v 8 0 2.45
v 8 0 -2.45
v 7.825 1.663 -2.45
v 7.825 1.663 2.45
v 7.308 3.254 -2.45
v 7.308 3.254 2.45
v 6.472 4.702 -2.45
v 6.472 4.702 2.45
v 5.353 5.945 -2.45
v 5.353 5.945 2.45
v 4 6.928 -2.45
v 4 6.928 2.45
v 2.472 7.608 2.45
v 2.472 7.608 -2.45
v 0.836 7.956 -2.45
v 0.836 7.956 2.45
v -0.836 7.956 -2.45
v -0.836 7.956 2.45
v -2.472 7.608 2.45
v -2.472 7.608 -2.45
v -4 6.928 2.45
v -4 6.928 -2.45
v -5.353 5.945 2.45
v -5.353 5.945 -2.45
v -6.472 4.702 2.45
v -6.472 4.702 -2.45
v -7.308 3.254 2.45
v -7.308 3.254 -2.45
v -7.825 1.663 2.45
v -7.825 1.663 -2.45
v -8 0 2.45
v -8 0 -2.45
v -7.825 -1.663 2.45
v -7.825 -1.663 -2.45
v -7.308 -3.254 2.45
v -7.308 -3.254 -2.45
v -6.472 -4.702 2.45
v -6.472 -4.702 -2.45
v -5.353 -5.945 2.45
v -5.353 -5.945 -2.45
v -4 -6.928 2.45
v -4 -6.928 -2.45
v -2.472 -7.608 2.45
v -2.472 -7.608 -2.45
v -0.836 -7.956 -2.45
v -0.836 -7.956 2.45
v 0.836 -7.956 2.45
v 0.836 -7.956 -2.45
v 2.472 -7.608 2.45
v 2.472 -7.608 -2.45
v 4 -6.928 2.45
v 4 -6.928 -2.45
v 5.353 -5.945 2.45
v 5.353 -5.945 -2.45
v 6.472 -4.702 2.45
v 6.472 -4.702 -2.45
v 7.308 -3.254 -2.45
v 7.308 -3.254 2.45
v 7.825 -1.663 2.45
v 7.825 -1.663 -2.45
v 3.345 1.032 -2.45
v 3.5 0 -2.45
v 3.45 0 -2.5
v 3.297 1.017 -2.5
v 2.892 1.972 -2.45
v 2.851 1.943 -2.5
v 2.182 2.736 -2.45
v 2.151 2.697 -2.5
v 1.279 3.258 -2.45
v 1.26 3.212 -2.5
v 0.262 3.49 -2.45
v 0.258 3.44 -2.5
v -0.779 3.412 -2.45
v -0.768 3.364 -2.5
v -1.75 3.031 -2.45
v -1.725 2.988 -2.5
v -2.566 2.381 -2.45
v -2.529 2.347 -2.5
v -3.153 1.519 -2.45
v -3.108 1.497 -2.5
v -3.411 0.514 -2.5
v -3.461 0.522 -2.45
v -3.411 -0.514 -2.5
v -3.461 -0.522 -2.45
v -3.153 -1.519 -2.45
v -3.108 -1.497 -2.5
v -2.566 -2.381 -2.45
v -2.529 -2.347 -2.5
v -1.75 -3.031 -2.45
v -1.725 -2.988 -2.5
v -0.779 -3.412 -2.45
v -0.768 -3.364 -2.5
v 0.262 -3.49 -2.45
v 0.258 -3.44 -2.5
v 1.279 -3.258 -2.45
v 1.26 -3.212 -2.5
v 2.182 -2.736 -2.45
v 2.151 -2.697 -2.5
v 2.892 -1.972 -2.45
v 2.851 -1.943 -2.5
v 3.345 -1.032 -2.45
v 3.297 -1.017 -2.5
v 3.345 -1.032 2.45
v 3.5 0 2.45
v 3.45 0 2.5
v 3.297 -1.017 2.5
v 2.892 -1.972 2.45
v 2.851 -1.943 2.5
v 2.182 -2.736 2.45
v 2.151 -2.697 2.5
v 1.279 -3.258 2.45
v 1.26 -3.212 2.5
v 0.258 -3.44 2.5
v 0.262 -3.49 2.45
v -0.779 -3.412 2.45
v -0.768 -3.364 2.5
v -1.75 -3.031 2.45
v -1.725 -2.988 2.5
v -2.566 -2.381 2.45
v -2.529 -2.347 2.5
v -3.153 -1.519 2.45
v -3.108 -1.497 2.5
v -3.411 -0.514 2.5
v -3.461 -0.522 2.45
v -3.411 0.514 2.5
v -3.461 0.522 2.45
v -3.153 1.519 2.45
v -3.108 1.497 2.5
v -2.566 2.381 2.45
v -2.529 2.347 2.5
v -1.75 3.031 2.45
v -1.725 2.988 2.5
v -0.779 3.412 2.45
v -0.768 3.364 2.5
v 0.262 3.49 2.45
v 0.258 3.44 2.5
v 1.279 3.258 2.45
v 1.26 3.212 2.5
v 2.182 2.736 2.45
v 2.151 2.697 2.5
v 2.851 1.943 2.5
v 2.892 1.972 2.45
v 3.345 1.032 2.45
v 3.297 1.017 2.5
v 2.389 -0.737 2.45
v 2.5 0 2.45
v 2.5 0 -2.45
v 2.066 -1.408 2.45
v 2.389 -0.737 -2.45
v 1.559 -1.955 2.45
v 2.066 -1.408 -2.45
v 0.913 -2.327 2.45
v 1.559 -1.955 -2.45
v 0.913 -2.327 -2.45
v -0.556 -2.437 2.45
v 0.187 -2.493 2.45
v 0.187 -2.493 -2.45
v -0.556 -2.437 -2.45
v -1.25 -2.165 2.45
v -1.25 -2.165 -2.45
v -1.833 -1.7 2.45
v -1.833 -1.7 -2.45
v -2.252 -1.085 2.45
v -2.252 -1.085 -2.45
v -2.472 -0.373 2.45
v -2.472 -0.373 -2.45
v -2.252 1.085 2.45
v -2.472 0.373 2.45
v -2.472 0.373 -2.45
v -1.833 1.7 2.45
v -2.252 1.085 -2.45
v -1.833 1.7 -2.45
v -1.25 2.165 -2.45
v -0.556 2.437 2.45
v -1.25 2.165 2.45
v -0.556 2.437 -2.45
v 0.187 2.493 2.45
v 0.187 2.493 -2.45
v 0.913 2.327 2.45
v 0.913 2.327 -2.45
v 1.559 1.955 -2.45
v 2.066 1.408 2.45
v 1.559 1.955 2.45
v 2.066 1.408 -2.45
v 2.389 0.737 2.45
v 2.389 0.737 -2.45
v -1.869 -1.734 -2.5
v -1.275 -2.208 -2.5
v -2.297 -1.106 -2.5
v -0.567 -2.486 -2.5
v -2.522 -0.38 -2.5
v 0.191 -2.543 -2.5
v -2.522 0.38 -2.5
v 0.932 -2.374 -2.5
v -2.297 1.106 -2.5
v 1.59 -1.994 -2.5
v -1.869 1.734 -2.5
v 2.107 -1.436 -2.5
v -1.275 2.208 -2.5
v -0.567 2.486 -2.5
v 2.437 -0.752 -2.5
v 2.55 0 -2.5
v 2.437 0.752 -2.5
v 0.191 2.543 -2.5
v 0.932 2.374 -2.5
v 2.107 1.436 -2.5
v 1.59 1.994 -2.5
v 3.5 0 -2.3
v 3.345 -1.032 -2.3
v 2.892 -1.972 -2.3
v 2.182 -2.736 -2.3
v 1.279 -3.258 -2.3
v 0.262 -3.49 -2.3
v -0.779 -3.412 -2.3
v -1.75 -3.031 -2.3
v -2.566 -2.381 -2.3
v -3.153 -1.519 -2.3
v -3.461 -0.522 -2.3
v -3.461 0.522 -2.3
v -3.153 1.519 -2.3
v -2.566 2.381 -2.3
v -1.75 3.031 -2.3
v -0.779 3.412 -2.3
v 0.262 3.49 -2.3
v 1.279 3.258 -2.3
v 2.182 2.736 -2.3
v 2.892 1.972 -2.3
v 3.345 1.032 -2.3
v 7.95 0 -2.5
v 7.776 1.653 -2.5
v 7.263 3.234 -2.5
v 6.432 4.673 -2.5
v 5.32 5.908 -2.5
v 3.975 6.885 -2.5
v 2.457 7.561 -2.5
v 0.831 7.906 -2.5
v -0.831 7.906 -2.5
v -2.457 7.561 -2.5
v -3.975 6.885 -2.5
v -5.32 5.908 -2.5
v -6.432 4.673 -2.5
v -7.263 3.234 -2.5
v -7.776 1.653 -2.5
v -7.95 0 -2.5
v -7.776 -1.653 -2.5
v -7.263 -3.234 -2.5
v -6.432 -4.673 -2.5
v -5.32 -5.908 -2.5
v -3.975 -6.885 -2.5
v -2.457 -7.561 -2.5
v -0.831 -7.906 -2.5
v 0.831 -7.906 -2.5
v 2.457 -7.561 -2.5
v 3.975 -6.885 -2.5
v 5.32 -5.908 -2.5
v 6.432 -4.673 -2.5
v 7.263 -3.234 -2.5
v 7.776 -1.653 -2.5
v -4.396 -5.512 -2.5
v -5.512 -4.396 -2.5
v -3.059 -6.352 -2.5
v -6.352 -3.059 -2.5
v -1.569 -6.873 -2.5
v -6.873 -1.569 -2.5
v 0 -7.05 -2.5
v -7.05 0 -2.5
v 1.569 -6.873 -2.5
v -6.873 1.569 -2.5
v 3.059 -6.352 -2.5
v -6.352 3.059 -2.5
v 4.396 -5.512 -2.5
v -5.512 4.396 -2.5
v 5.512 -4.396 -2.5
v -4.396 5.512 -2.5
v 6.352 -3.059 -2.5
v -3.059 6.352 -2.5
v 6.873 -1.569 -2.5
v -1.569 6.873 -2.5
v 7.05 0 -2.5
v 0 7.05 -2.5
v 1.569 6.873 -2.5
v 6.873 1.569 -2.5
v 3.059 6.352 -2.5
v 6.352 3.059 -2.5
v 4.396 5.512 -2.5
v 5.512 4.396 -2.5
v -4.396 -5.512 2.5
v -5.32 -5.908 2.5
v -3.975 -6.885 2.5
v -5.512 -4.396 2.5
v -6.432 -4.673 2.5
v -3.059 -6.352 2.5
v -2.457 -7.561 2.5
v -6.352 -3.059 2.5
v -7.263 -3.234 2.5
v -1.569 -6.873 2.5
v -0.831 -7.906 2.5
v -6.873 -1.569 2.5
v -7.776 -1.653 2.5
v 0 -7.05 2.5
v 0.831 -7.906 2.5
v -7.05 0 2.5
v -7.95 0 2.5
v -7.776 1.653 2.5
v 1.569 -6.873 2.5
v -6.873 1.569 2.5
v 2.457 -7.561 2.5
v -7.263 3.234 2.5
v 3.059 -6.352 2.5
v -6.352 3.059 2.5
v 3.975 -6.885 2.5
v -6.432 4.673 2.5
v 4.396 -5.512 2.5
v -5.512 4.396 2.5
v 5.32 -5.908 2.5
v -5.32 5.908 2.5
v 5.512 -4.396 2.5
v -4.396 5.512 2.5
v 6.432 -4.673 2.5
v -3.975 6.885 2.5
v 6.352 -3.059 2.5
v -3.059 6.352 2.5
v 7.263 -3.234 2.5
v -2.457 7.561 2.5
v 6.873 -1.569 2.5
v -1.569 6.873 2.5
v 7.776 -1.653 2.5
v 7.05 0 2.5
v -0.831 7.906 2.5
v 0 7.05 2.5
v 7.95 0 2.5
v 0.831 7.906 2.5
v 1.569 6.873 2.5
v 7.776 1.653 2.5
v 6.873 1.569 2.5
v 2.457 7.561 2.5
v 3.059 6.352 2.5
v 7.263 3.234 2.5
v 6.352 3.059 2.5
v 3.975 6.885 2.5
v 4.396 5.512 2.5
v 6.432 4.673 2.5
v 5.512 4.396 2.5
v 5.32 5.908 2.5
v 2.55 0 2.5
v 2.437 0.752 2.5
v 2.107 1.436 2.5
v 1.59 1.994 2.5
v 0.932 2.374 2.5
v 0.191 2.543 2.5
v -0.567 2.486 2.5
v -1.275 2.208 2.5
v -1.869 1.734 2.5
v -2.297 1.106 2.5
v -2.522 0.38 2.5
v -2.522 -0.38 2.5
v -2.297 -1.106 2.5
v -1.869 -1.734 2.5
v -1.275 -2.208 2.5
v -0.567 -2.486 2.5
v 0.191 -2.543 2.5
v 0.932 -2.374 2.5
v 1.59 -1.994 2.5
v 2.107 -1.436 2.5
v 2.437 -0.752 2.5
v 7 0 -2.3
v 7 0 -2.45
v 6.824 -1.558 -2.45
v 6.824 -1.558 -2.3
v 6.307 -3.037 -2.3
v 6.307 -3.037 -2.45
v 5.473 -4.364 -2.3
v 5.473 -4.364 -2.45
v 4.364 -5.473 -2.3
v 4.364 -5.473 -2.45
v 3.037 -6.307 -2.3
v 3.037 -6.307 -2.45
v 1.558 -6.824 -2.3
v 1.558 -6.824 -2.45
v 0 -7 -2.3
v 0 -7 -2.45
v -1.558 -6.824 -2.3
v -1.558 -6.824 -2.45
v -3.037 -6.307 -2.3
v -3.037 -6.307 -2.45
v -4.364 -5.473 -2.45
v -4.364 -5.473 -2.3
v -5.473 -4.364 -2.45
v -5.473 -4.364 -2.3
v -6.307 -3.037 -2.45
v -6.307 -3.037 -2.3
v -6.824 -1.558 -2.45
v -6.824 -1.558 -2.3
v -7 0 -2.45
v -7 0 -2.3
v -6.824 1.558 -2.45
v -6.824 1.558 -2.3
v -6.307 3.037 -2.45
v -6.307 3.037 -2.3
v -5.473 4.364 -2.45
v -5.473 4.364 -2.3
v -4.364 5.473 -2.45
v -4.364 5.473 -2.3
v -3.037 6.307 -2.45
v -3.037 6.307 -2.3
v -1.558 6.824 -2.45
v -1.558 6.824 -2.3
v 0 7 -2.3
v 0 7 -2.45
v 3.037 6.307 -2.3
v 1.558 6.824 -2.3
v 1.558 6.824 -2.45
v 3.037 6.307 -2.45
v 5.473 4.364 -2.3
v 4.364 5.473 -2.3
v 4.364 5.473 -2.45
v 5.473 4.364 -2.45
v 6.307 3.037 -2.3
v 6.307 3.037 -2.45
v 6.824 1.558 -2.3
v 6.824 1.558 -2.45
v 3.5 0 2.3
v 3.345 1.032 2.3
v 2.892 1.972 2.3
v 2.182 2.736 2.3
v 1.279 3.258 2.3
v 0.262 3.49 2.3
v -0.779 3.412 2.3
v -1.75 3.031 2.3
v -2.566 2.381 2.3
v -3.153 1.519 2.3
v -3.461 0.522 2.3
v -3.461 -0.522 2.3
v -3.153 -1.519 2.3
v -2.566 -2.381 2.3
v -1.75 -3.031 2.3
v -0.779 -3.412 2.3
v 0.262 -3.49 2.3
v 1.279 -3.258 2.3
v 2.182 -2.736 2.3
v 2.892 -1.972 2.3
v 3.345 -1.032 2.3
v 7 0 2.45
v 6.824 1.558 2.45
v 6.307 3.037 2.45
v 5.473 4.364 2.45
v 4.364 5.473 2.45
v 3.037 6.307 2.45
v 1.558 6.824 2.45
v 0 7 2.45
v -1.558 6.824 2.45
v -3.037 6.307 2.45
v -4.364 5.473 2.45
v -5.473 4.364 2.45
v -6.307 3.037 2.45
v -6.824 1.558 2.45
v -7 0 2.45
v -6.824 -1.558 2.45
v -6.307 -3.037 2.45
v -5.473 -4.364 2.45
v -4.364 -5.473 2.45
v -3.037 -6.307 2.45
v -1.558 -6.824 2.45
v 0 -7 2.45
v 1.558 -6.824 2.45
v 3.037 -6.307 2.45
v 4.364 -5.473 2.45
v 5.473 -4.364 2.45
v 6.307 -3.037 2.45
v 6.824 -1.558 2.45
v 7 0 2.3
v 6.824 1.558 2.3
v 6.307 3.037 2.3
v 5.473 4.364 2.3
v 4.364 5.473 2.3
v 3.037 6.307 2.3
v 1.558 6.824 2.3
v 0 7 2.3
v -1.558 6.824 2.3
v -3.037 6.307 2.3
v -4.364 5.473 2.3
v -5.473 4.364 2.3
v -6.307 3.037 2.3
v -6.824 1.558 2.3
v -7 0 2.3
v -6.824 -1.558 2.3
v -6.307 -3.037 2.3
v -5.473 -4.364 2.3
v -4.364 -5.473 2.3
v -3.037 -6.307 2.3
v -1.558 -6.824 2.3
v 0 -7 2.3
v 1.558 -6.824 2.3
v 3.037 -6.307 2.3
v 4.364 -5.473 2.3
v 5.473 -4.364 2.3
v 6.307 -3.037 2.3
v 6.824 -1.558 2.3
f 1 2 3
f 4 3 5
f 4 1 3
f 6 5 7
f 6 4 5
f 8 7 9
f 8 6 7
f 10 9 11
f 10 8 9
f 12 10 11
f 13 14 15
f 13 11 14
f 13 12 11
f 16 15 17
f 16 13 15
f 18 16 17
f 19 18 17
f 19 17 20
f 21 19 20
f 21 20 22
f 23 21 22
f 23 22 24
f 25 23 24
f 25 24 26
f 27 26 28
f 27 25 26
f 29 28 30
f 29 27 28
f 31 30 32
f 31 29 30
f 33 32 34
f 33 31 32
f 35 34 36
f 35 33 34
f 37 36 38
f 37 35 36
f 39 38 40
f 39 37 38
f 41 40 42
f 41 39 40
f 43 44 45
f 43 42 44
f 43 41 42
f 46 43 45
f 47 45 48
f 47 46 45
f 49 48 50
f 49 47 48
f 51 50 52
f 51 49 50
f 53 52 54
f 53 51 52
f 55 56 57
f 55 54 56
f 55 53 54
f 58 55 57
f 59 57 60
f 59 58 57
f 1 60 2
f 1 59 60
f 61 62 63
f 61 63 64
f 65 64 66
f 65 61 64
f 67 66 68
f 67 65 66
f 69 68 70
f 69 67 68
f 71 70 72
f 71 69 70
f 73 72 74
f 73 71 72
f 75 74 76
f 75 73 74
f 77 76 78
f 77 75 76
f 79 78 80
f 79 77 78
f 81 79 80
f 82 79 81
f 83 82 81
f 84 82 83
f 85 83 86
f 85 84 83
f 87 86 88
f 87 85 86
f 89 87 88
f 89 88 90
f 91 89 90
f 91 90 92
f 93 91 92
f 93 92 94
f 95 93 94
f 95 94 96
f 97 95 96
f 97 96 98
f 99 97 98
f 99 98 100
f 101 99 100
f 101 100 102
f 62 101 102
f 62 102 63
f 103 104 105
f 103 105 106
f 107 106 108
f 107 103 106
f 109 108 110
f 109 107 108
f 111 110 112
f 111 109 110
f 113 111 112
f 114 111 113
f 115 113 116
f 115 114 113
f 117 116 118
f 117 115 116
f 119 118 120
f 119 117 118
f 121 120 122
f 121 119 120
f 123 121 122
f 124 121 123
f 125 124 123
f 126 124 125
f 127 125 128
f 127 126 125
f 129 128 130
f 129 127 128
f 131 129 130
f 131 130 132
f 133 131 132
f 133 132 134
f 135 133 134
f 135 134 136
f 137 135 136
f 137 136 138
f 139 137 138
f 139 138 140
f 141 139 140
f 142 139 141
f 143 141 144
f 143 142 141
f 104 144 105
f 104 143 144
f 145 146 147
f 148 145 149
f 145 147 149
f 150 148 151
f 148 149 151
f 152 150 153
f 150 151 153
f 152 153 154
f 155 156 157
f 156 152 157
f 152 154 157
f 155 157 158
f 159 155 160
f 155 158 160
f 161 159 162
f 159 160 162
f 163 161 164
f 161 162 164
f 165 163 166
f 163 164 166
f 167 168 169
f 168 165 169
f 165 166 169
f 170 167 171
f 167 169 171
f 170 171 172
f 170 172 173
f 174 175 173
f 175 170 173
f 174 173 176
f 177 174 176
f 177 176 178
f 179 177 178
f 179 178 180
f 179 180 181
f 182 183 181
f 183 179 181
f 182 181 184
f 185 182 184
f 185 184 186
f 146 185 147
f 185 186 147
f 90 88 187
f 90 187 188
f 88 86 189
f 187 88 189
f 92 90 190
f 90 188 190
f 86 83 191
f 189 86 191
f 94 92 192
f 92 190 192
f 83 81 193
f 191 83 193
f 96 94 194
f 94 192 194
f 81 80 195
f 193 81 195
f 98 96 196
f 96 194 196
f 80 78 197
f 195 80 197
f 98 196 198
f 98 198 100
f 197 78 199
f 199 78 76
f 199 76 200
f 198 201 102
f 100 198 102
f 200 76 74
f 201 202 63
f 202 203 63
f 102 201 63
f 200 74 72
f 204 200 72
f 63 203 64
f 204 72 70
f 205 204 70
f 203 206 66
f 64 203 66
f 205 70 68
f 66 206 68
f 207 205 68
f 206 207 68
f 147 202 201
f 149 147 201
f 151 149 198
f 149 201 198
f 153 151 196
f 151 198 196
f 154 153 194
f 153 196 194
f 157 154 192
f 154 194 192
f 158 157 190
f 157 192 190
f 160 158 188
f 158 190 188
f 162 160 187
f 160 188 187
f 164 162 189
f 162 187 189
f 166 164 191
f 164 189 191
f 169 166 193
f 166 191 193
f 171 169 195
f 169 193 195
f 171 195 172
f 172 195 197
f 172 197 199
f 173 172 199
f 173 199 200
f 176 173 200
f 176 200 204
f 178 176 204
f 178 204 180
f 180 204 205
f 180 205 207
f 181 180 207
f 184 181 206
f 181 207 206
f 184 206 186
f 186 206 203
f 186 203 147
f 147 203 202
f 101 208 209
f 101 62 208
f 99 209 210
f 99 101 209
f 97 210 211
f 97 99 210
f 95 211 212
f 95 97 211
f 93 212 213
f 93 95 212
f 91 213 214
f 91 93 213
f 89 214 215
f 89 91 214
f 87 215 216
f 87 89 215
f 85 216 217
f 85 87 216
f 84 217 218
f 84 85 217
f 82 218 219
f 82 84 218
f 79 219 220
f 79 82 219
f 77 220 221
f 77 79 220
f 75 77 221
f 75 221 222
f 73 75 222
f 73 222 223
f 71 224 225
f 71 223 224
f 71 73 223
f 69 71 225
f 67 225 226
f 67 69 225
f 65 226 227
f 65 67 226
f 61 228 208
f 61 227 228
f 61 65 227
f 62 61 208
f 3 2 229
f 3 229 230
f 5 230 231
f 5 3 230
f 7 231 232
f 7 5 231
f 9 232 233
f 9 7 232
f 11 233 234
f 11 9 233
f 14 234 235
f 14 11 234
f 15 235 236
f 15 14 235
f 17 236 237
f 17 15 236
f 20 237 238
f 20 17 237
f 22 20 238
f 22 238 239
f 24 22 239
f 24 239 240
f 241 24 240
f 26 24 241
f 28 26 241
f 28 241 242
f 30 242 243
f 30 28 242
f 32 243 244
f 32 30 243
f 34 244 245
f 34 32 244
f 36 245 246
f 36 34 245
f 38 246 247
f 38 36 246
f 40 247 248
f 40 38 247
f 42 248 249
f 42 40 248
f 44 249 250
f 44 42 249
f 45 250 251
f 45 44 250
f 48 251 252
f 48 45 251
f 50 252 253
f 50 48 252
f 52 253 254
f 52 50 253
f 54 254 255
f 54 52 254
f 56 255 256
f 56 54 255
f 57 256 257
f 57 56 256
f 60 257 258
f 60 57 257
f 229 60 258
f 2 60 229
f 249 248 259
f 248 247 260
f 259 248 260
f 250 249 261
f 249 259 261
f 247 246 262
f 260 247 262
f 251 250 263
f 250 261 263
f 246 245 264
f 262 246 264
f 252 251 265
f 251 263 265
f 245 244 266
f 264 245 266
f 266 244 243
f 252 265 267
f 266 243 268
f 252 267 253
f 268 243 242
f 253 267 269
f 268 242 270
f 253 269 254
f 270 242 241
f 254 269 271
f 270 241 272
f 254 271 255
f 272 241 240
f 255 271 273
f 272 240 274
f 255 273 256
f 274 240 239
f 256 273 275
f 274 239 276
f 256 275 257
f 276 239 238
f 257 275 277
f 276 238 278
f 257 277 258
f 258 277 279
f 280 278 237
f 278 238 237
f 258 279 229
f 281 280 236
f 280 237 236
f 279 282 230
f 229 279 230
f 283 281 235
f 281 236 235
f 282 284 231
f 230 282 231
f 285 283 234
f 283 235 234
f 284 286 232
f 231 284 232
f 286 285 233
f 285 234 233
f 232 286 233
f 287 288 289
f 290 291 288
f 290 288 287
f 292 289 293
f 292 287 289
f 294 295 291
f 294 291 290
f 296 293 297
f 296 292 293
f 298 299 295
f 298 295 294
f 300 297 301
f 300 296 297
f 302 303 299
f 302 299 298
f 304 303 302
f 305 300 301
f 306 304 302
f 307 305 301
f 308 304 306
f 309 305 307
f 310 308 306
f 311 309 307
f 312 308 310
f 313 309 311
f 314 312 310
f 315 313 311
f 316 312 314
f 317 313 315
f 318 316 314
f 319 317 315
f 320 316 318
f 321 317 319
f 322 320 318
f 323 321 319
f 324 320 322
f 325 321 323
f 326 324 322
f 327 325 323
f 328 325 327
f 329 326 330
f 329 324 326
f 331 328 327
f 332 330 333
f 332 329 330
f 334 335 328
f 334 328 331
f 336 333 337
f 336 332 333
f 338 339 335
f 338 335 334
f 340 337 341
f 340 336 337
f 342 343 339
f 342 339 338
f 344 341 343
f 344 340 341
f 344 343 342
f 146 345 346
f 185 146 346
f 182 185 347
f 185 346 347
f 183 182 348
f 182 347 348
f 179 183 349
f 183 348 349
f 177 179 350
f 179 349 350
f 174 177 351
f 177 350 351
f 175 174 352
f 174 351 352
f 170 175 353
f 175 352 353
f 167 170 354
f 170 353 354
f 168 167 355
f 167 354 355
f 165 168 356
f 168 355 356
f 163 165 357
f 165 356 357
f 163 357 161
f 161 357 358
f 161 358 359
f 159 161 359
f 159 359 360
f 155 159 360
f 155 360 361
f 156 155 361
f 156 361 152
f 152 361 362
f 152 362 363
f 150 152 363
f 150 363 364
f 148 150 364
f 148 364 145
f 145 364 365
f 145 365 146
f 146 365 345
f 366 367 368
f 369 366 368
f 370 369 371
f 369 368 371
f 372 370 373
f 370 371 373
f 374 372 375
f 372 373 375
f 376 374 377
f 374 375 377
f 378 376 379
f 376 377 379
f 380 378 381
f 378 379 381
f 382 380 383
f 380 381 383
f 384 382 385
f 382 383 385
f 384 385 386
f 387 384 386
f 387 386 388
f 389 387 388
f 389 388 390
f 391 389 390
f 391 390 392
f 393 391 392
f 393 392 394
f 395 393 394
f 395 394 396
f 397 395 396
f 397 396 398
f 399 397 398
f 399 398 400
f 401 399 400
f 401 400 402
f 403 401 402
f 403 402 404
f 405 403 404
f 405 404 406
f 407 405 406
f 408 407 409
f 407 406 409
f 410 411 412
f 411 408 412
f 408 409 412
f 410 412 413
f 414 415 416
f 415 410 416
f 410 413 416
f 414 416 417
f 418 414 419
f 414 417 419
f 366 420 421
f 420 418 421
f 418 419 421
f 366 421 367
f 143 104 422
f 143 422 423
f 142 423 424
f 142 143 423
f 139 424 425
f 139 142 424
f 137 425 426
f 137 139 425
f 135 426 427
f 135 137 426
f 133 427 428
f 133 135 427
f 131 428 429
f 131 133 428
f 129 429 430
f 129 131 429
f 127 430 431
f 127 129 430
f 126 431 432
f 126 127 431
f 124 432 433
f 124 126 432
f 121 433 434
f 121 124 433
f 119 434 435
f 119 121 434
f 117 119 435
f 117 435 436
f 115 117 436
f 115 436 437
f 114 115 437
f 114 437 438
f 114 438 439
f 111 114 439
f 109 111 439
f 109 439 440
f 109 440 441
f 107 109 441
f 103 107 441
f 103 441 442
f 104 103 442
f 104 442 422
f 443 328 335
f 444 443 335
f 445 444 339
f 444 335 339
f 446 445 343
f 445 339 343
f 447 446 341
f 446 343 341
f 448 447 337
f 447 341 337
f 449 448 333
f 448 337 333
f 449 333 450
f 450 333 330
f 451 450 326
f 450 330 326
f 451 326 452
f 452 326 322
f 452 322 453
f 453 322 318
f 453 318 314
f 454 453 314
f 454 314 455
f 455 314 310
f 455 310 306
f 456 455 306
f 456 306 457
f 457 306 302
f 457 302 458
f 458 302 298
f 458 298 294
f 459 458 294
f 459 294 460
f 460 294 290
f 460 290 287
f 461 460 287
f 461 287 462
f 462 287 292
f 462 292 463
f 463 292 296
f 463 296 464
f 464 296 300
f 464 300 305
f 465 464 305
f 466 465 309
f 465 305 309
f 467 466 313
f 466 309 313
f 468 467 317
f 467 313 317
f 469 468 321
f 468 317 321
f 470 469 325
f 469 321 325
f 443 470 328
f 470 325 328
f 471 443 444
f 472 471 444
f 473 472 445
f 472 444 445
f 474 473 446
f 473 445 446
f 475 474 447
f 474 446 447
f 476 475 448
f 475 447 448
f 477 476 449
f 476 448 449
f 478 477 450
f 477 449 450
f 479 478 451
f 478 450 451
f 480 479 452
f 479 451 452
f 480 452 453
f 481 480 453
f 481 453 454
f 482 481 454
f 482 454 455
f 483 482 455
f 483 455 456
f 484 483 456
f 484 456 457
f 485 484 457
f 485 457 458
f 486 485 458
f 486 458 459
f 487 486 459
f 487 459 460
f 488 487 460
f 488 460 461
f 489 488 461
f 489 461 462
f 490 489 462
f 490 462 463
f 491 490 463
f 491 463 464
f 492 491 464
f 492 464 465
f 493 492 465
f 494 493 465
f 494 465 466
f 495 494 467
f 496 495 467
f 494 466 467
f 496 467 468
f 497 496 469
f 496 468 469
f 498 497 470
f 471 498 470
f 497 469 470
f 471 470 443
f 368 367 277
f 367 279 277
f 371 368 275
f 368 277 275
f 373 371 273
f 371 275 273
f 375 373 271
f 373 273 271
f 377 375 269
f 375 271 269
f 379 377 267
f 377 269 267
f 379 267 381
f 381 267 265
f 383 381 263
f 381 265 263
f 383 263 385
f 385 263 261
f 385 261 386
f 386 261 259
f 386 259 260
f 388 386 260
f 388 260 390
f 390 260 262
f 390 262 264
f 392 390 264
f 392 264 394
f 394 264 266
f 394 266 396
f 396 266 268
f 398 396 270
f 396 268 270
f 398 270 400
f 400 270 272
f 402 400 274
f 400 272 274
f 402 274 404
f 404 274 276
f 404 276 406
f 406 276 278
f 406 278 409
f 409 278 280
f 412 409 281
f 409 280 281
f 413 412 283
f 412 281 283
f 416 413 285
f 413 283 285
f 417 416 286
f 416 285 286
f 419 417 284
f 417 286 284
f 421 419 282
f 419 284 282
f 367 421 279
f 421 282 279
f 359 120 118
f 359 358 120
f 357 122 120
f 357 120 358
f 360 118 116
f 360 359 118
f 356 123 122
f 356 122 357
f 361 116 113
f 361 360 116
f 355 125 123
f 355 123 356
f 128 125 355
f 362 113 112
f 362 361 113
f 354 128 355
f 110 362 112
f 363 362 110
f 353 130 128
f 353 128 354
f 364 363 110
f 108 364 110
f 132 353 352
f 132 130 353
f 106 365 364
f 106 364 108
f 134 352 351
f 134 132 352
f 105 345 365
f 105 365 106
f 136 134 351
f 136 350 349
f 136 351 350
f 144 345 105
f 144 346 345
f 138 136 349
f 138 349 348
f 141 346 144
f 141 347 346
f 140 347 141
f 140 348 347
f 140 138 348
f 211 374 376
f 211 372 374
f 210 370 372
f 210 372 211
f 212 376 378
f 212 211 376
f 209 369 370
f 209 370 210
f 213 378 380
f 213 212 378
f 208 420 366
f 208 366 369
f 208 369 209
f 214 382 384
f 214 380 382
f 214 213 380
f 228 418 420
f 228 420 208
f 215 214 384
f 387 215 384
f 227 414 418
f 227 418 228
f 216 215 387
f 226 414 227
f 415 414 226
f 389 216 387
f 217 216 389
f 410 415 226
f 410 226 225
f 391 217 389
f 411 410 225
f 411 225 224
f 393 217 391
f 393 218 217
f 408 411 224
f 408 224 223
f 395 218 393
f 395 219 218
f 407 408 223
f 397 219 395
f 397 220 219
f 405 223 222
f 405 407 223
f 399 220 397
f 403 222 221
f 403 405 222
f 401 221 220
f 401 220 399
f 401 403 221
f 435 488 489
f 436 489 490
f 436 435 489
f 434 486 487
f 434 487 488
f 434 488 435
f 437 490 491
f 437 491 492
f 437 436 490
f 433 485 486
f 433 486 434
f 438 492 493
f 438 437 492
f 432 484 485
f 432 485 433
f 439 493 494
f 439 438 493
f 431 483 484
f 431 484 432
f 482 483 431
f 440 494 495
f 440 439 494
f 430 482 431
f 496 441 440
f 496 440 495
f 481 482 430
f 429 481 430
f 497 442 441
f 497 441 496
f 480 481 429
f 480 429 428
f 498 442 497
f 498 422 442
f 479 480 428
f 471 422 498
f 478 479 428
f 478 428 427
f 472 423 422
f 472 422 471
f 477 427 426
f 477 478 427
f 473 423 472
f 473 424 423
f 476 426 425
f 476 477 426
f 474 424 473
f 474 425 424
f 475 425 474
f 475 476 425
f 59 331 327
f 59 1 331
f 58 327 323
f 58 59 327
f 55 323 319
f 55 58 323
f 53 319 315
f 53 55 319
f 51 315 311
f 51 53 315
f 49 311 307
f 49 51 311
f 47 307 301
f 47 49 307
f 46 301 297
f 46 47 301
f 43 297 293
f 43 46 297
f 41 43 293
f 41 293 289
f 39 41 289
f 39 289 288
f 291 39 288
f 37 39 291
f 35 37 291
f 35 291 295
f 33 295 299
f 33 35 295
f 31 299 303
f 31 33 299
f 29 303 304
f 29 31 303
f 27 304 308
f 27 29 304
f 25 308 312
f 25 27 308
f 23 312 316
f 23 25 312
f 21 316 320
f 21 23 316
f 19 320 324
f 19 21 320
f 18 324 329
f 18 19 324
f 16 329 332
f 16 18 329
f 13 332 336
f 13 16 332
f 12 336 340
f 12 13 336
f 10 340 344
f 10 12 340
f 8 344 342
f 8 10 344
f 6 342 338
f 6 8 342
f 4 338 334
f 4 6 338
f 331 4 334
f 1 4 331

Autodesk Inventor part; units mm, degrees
ref_plane "YZ Plane" through (0, 0, 0) normal (1, 0, 0) x (0, 1, 0)
ref_plane "XZ Plane" through (0, 0, 0) normal (0, 1, 0) x (-1, 0, 0)
ref_plane "XY Plane" through (0, 0, 0) normal (0, 0, 1) x (1, 0, 0)
sketch "Skizze1" plane through (0, 0, 0) normal (0, 0, 1) x (1, 0, 0)
  line L0 (-11.2, 0) -> (11.2, 0) projected
  line L1 (0, -11.2) -> (0, 11.2) projected
  circle A0 centre (0, 0) radius 8
  circle A1 centre (0, 0) radius 2.5
  dimension "d0" = 16
  dimension "d1" = 5
extrude "Extrusion1" add sketch "Skizze1" along normal mid plane 5 contours A1 L1 A0 L0 | L0 A0 L1 A1 | A1 L0 A0 L1 | L1 A0 L0 A1
sketch "Skizze2" plane through (0, 0, 2.5) normal (0, 0, 1) x (1, 0, 0)
  circle A0 centre (0, 0) radius 2.5 projected
  circle A1 centre (0, 0) radius 8 projected
  circle A2 centre (0, 0) radius 3.5
  circle A3 centre (0, 0) radius 7
  dimension "d4" = 7
  dimension "d5" = 14
extrude "Extrusion2" cut sketch "Skizze2" against normal blind 0.2 contours A3
mirror "Spiegeln1" about plane through (0, 0, 0) normal (0, 0, 1) of "Extrusion2"
chamfer "Fase1" distance 0.05 angle 45 1 edges at (-7, 0, 2.5)
chamfer "Fase2" distance 0.05 angle 45 1 edges at (-3.5, 0, 2.5)
chamfer "Fase3" distance 0.05 angle 45 1 edges at (-2.5, 0, 2.5)
chamfer "Fase4" distance 0.05 angle 45 1 edges at (-8, 0, 2.5)
chamfer "Fase5" distance 0.05 angle 45 1 edges at (-8, 0, -2.5)
chamfer "Fase6" distance 0.05 angle 45 1 edges at (-7, 0, -2.5)
chamfer "Fase7" distance 0.05 angle 45 1 edges at (-3.5, 0, -2.5)
chamfer "Fase8" distance 0.05 angle 45 1 edges at (-2.5, 0, -2.5)
properties part number "Kugellager625_5x16x5" material "Stahl, Kohlenstoff"
